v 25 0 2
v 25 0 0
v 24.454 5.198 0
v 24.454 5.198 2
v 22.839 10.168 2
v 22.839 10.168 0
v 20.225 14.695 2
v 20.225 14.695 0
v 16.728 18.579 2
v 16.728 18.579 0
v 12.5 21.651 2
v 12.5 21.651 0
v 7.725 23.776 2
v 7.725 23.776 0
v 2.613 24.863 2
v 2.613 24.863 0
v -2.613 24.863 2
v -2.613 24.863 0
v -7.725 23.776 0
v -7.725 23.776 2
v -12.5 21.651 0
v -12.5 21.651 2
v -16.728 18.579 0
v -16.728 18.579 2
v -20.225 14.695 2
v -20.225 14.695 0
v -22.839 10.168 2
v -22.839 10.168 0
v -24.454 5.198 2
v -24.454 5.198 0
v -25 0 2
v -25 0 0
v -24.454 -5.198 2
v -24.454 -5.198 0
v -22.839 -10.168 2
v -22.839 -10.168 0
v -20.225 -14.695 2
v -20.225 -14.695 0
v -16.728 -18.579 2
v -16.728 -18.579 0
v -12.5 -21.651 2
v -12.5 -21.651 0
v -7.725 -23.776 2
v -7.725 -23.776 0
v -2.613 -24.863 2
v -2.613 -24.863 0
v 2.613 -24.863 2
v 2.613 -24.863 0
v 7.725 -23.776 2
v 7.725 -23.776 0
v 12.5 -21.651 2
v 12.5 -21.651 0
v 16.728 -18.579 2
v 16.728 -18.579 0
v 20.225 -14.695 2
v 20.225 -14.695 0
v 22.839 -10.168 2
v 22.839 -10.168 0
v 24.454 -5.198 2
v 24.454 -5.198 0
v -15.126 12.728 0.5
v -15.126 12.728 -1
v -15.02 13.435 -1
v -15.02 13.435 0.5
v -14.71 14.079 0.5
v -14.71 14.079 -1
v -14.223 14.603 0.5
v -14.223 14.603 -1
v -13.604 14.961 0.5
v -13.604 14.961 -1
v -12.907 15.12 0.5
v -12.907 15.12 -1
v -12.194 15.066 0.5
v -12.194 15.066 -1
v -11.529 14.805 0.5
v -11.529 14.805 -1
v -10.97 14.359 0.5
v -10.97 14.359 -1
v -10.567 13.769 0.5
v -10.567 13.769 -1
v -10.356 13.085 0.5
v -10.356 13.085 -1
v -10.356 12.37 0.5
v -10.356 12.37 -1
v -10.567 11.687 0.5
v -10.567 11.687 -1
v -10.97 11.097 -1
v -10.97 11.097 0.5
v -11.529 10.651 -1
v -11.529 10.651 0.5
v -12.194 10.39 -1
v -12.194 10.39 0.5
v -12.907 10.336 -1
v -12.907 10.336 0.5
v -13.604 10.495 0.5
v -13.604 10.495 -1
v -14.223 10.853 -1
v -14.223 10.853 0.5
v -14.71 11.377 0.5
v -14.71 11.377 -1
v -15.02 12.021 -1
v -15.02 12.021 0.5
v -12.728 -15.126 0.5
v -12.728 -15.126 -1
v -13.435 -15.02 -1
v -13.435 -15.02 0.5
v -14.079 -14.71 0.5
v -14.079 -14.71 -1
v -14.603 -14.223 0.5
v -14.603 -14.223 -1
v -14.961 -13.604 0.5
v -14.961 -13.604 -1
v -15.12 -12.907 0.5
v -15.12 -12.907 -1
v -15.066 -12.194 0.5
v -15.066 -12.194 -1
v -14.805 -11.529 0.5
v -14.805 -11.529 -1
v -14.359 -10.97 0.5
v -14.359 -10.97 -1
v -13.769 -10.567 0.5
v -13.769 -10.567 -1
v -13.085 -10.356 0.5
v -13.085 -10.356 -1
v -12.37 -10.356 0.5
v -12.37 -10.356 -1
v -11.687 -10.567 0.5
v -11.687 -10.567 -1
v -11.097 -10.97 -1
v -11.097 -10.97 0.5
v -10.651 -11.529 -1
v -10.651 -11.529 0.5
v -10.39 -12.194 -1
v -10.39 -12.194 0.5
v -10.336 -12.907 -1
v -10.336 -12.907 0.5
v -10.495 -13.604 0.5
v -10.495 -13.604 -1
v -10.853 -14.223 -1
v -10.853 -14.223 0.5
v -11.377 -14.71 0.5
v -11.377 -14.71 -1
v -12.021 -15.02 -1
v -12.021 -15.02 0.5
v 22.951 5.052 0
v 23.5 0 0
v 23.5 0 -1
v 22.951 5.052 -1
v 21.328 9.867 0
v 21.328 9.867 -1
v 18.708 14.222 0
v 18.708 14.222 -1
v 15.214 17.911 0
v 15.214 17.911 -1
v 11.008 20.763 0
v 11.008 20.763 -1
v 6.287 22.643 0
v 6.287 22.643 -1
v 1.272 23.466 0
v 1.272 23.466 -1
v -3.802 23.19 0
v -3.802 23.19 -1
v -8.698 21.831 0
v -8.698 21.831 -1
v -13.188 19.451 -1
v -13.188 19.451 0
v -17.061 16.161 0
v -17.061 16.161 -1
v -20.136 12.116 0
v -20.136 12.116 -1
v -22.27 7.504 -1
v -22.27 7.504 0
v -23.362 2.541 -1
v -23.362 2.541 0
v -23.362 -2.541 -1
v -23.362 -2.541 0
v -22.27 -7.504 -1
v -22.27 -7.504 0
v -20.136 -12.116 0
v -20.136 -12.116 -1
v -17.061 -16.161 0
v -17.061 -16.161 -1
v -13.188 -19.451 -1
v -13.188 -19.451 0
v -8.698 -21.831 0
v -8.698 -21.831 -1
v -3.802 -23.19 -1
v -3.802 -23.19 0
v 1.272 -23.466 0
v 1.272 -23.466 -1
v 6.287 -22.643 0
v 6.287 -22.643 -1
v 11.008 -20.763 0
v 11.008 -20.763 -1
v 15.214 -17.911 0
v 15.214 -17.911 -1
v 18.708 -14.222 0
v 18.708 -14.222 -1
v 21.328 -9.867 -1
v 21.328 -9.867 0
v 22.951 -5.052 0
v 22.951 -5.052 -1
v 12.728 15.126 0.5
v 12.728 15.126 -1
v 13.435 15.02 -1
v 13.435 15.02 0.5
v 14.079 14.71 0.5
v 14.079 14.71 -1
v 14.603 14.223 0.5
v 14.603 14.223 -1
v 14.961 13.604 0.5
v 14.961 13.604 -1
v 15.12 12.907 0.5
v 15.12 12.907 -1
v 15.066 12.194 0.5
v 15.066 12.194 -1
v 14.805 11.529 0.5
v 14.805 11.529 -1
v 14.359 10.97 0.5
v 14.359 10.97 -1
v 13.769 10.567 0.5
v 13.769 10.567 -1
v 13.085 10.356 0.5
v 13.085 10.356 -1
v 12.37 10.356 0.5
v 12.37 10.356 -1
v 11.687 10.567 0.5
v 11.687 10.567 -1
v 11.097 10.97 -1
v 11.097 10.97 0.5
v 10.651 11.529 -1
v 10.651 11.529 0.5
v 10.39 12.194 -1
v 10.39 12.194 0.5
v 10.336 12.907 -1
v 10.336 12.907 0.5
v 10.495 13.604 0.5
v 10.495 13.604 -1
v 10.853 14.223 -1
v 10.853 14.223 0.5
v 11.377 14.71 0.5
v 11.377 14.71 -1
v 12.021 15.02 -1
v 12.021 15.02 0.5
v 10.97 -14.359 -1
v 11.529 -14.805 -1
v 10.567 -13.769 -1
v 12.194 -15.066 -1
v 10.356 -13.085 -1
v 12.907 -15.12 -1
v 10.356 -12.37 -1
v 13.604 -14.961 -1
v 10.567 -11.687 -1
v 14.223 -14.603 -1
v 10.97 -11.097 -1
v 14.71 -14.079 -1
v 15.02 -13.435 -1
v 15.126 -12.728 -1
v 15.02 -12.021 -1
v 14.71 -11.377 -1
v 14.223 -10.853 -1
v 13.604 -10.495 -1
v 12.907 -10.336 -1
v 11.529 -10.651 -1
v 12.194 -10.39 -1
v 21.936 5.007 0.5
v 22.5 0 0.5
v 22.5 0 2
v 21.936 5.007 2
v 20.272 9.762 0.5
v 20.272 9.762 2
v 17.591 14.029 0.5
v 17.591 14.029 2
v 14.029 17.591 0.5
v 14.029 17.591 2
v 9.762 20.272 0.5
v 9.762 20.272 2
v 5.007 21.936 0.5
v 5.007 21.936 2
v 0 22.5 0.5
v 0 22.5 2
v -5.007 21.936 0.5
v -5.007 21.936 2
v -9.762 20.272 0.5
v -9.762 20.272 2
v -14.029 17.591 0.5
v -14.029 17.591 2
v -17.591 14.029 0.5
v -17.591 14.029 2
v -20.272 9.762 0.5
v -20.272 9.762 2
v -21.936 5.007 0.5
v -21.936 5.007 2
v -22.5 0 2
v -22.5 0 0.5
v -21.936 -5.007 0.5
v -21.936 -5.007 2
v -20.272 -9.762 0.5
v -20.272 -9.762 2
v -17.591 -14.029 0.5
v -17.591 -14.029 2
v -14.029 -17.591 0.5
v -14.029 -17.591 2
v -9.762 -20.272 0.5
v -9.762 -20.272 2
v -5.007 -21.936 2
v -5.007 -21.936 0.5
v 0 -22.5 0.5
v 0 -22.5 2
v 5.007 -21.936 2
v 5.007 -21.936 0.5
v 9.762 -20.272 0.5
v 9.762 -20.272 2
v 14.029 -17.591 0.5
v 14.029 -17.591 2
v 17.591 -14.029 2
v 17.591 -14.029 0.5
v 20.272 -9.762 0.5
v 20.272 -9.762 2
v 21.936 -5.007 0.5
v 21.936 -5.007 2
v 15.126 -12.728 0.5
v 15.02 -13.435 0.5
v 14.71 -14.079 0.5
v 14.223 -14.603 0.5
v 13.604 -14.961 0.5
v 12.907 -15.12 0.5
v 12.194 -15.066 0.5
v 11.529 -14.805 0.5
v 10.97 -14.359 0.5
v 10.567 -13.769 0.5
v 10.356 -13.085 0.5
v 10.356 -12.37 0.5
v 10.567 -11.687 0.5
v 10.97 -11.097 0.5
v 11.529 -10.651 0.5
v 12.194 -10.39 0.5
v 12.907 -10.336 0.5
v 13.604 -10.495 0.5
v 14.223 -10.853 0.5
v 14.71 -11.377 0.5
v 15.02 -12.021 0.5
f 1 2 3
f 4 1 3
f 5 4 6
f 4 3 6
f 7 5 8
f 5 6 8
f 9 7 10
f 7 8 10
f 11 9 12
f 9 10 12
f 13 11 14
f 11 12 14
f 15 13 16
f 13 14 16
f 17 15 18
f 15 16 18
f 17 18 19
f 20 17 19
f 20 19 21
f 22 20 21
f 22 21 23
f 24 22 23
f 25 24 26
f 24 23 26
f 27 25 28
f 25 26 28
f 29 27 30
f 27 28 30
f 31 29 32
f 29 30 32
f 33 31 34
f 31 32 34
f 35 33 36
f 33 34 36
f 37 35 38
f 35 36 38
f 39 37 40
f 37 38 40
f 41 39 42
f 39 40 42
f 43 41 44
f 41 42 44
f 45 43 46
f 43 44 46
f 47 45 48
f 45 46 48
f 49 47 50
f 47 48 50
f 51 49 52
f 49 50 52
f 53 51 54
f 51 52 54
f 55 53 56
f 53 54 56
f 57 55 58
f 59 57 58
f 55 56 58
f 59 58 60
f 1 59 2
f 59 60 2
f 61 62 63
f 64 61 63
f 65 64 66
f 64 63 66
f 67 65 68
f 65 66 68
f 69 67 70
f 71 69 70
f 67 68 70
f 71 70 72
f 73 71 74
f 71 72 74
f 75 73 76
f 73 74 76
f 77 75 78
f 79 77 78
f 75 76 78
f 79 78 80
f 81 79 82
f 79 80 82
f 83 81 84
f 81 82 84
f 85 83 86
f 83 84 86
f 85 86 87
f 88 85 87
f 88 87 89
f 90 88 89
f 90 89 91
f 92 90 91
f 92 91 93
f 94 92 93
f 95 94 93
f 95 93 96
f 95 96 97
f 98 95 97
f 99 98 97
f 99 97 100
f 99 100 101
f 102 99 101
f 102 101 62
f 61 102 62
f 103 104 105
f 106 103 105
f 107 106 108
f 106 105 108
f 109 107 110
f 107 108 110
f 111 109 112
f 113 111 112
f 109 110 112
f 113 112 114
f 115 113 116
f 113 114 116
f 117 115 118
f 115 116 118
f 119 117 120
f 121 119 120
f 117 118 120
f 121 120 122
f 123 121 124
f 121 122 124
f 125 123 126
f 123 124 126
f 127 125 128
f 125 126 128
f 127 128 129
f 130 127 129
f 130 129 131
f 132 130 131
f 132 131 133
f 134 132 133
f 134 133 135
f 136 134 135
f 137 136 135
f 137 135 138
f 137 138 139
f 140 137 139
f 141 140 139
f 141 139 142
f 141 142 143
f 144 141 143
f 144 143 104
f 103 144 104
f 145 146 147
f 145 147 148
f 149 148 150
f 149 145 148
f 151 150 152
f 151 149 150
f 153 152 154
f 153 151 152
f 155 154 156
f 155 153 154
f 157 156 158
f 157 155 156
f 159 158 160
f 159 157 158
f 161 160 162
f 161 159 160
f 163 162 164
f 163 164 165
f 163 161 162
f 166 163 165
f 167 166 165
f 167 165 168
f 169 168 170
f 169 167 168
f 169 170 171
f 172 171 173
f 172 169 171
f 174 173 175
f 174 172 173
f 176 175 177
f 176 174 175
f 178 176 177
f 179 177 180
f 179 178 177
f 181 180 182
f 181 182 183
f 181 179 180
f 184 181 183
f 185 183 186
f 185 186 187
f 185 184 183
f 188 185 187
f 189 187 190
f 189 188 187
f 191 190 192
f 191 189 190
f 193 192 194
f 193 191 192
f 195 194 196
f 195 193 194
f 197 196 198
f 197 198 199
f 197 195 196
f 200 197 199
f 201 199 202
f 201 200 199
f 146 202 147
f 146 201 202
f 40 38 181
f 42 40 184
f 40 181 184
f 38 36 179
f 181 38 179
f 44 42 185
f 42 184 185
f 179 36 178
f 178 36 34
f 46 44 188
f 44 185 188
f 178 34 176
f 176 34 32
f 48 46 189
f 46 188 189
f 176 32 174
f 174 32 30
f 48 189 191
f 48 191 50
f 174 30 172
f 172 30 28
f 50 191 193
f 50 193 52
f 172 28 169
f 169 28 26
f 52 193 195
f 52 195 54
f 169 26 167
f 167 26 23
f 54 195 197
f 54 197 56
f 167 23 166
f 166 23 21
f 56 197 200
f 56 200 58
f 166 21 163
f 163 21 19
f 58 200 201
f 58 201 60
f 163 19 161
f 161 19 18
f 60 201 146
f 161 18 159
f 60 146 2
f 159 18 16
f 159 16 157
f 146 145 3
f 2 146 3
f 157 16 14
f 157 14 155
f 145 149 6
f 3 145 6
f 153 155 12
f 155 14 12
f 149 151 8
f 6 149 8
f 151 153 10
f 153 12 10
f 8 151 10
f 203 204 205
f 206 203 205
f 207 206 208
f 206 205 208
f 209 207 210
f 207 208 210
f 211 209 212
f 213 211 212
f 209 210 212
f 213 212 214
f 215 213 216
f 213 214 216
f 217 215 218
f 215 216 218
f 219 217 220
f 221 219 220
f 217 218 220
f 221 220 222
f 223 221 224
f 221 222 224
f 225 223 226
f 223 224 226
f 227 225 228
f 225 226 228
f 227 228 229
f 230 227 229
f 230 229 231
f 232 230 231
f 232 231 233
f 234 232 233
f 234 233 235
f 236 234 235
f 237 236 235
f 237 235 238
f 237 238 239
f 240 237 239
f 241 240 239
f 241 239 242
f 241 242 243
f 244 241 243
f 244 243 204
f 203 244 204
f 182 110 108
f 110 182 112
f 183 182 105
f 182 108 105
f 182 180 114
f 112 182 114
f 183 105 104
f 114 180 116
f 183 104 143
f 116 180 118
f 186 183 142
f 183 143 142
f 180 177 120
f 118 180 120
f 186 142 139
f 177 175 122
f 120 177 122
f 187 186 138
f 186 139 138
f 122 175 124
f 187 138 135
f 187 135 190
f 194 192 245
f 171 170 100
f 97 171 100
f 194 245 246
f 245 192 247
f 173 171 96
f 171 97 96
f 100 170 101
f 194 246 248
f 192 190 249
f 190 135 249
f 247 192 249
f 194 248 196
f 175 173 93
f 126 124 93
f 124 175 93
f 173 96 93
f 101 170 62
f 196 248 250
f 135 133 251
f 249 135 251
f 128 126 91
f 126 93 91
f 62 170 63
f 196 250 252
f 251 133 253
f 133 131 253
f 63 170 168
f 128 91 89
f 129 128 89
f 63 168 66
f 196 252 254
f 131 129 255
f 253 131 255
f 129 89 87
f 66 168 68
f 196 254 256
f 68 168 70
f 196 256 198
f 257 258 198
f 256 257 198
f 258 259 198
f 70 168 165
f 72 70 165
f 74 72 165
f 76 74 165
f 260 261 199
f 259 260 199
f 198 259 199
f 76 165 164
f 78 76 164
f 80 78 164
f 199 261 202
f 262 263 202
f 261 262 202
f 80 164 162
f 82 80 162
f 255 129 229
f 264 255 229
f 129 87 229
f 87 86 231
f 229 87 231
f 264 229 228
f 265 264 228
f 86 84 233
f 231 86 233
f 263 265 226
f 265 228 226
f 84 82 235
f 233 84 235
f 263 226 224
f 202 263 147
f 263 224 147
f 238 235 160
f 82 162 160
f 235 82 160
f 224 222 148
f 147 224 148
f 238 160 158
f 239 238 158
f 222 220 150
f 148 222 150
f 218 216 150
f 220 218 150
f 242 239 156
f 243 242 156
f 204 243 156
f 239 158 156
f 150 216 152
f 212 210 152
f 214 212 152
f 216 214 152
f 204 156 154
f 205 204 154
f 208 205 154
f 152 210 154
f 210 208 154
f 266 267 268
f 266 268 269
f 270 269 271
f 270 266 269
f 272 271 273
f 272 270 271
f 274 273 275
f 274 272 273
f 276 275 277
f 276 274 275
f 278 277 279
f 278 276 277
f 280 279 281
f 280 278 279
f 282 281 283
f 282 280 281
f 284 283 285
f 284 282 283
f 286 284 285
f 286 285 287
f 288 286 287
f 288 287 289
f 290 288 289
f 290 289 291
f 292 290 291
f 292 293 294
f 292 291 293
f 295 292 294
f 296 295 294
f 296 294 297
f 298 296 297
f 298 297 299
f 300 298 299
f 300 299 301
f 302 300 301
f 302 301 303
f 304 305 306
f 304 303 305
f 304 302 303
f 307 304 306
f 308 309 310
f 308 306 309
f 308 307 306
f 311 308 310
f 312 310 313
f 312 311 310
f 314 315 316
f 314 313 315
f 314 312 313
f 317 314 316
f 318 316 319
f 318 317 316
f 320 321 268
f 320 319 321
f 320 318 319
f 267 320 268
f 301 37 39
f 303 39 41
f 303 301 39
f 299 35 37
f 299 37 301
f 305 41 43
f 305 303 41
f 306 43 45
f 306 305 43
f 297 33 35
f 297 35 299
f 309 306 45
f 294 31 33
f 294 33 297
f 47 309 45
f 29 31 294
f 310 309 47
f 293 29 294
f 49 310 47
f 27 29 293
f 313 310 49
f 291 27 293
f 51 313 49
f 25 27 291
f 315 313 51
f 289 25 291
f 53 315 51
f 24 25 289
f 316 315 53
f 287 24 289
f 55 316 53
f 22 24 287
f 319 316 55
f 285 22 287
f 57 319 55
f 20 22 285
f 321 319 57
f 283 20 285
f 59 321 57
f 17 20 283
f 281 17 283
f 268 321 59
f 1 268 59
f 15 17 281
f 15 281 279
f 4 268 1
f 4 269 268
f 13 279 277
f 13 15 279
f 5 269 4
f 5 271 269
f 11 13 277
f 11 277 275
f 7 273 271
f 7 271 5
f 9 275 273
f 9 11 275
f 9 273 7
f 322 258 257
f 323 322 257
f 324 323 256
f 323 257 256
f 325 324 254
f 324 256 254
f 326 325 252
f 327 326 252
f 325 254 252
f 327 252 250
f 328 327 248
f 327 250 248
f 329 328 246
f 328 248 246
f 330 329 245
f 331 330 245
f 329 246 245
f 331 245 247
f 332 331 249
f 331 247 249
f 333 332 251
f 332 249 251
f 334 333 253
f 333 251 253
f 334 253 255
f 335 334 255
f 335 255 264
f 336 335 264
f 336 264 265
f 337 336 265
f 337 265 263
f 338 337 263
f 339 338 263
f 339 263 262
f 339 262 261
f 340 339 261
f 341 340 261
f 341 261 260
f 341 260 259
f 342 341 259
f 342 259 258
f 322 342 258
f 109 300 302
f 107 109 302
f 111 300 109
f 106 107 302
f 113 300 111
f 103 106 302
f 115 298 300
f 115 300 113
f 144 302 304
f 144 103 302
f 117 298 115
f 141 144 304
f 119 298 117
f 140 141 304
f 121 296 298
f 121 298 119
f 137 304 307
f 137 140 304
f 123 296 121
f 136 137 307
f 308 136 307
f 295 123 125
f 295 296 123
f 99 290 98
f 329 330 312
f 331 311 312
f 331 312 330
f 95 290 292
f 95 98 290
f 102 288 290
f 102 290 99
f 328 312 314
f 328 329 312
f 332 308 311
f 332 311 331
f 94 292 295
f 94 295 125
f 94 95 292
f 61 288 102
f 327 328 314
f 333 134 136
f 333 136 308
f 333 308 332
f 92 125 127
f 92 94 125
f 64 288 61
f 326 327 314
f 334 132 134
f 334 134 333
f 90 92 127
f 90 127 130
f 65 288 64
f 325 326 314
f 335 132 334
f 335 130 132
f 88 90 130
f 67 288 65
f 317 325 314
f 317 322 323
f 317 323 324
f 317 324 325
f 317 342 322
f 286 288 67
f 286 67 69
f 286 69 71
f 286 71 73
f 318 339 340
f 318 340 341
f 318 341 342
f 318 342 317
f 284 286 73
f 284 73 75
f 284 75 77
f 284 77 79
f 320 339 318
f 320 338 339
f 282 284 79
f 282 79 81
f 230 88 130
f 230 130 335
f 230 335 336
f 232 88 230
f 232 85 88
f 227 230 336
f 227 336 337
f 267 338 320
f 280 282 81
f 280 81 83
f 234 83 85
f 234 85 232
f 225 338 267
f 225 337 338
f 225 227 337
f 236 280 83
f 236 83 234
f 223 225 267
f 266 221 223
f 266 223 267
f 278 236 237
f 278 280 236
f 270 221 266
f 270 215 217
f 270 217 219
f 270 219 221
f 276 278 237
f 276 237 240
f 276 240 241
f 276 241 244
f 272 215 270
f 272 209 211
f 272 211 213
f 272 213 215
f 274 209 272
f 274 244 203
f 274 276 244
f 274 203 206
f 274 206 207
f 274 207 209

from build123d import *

# Parameters (mm, degrees)
SKETCH1_R           = 25
BOSS_EXTRUDE1_DEPTH = 2
SKETCH1_3_R         = 23.5
BOSS_EXTRUDE2_DEPTH = 1
CUT_EXTRUDE1_REACH  = 4
SKETCH1_4_R         = 22.5
SKETCH1_5_R         = 22.5
BOSS_EXTRUDE3_DEPTH = 0.5
SKETCH2_R           = 2.398519327
CUT_EXTRUDE2_DEPTH  = 10.5
CIRPATTERN1_COUNT   = 4


with BuildPart() as part:
    # Sketch1 → Boss-Extrude1 (new body)
    with BuildSketch(Plane.XY):
        Circle(SKETCH1_R)
    extrude(amount=BOSS_EXTRUDE1_DEPTH)

    # Sketch1_3 → Boss-Extrude2 (add)
    with BuildSketch(Plane.XY):
        Circle(SKETCH1_3_R)
    extrude(amount=-BOSS_EXTRUDE2_DEPTH)

    # Sketch1_4 → Cut-Extrude1 (cut, up to next)
    with BuildSketch(Plane.XY, mode=Mode.PRIVATE) as cut_extrude1_sk1:
        Circle(SKETCH1_4_R)
    cut_extrude1_tool1 = extrude(cut_extrude1_sk1.sketch, amount=CUT_EXTRUDE1_REACH, mode=Mode.PRIVATE) & part.part
    add(cut_extrude1_tool1.solids().sort_by_distance((0, 0, 0))[0], mode=Mode.SUBTRACT)

    # Sketch1_5 → Boss-Extrude3 (add)
    with BuildSketch(Plane.XY):
        Circle(SKETCH1_5_R)
    extrude(amount=BOSS_EXTRUDE3_DEPTH)

    # Sketch2 → Cut-Extrude2 (cut)
    with BuildSketch(Plane(origin=(0, 0, -1), x_dir=(-1, 0, 0), z_dir=(0, 0, -1))):
        with Locations((12.727922061, 12.727922061)):
            Circle(SKETCH2_R)
    cut_extrude2 = extrude(amount=-CUT_EXTRUDE2_DEPTH, mode=Mode.SUBTRACT)

    # CirPattern1: Cut-Extrude2 ×4 about axis
    cirpattern1_axis = Axis((0, 0, 0), (0, 0, 1))
    for i in range(1, CIRPATTERN1_COUNT):
        add(cut_extrude2.rotate(cirpattern1_axis, i * 360 / CIRPATTERN1_COUNT), mode=Mode.SUBTRACT)


solid = part.part
